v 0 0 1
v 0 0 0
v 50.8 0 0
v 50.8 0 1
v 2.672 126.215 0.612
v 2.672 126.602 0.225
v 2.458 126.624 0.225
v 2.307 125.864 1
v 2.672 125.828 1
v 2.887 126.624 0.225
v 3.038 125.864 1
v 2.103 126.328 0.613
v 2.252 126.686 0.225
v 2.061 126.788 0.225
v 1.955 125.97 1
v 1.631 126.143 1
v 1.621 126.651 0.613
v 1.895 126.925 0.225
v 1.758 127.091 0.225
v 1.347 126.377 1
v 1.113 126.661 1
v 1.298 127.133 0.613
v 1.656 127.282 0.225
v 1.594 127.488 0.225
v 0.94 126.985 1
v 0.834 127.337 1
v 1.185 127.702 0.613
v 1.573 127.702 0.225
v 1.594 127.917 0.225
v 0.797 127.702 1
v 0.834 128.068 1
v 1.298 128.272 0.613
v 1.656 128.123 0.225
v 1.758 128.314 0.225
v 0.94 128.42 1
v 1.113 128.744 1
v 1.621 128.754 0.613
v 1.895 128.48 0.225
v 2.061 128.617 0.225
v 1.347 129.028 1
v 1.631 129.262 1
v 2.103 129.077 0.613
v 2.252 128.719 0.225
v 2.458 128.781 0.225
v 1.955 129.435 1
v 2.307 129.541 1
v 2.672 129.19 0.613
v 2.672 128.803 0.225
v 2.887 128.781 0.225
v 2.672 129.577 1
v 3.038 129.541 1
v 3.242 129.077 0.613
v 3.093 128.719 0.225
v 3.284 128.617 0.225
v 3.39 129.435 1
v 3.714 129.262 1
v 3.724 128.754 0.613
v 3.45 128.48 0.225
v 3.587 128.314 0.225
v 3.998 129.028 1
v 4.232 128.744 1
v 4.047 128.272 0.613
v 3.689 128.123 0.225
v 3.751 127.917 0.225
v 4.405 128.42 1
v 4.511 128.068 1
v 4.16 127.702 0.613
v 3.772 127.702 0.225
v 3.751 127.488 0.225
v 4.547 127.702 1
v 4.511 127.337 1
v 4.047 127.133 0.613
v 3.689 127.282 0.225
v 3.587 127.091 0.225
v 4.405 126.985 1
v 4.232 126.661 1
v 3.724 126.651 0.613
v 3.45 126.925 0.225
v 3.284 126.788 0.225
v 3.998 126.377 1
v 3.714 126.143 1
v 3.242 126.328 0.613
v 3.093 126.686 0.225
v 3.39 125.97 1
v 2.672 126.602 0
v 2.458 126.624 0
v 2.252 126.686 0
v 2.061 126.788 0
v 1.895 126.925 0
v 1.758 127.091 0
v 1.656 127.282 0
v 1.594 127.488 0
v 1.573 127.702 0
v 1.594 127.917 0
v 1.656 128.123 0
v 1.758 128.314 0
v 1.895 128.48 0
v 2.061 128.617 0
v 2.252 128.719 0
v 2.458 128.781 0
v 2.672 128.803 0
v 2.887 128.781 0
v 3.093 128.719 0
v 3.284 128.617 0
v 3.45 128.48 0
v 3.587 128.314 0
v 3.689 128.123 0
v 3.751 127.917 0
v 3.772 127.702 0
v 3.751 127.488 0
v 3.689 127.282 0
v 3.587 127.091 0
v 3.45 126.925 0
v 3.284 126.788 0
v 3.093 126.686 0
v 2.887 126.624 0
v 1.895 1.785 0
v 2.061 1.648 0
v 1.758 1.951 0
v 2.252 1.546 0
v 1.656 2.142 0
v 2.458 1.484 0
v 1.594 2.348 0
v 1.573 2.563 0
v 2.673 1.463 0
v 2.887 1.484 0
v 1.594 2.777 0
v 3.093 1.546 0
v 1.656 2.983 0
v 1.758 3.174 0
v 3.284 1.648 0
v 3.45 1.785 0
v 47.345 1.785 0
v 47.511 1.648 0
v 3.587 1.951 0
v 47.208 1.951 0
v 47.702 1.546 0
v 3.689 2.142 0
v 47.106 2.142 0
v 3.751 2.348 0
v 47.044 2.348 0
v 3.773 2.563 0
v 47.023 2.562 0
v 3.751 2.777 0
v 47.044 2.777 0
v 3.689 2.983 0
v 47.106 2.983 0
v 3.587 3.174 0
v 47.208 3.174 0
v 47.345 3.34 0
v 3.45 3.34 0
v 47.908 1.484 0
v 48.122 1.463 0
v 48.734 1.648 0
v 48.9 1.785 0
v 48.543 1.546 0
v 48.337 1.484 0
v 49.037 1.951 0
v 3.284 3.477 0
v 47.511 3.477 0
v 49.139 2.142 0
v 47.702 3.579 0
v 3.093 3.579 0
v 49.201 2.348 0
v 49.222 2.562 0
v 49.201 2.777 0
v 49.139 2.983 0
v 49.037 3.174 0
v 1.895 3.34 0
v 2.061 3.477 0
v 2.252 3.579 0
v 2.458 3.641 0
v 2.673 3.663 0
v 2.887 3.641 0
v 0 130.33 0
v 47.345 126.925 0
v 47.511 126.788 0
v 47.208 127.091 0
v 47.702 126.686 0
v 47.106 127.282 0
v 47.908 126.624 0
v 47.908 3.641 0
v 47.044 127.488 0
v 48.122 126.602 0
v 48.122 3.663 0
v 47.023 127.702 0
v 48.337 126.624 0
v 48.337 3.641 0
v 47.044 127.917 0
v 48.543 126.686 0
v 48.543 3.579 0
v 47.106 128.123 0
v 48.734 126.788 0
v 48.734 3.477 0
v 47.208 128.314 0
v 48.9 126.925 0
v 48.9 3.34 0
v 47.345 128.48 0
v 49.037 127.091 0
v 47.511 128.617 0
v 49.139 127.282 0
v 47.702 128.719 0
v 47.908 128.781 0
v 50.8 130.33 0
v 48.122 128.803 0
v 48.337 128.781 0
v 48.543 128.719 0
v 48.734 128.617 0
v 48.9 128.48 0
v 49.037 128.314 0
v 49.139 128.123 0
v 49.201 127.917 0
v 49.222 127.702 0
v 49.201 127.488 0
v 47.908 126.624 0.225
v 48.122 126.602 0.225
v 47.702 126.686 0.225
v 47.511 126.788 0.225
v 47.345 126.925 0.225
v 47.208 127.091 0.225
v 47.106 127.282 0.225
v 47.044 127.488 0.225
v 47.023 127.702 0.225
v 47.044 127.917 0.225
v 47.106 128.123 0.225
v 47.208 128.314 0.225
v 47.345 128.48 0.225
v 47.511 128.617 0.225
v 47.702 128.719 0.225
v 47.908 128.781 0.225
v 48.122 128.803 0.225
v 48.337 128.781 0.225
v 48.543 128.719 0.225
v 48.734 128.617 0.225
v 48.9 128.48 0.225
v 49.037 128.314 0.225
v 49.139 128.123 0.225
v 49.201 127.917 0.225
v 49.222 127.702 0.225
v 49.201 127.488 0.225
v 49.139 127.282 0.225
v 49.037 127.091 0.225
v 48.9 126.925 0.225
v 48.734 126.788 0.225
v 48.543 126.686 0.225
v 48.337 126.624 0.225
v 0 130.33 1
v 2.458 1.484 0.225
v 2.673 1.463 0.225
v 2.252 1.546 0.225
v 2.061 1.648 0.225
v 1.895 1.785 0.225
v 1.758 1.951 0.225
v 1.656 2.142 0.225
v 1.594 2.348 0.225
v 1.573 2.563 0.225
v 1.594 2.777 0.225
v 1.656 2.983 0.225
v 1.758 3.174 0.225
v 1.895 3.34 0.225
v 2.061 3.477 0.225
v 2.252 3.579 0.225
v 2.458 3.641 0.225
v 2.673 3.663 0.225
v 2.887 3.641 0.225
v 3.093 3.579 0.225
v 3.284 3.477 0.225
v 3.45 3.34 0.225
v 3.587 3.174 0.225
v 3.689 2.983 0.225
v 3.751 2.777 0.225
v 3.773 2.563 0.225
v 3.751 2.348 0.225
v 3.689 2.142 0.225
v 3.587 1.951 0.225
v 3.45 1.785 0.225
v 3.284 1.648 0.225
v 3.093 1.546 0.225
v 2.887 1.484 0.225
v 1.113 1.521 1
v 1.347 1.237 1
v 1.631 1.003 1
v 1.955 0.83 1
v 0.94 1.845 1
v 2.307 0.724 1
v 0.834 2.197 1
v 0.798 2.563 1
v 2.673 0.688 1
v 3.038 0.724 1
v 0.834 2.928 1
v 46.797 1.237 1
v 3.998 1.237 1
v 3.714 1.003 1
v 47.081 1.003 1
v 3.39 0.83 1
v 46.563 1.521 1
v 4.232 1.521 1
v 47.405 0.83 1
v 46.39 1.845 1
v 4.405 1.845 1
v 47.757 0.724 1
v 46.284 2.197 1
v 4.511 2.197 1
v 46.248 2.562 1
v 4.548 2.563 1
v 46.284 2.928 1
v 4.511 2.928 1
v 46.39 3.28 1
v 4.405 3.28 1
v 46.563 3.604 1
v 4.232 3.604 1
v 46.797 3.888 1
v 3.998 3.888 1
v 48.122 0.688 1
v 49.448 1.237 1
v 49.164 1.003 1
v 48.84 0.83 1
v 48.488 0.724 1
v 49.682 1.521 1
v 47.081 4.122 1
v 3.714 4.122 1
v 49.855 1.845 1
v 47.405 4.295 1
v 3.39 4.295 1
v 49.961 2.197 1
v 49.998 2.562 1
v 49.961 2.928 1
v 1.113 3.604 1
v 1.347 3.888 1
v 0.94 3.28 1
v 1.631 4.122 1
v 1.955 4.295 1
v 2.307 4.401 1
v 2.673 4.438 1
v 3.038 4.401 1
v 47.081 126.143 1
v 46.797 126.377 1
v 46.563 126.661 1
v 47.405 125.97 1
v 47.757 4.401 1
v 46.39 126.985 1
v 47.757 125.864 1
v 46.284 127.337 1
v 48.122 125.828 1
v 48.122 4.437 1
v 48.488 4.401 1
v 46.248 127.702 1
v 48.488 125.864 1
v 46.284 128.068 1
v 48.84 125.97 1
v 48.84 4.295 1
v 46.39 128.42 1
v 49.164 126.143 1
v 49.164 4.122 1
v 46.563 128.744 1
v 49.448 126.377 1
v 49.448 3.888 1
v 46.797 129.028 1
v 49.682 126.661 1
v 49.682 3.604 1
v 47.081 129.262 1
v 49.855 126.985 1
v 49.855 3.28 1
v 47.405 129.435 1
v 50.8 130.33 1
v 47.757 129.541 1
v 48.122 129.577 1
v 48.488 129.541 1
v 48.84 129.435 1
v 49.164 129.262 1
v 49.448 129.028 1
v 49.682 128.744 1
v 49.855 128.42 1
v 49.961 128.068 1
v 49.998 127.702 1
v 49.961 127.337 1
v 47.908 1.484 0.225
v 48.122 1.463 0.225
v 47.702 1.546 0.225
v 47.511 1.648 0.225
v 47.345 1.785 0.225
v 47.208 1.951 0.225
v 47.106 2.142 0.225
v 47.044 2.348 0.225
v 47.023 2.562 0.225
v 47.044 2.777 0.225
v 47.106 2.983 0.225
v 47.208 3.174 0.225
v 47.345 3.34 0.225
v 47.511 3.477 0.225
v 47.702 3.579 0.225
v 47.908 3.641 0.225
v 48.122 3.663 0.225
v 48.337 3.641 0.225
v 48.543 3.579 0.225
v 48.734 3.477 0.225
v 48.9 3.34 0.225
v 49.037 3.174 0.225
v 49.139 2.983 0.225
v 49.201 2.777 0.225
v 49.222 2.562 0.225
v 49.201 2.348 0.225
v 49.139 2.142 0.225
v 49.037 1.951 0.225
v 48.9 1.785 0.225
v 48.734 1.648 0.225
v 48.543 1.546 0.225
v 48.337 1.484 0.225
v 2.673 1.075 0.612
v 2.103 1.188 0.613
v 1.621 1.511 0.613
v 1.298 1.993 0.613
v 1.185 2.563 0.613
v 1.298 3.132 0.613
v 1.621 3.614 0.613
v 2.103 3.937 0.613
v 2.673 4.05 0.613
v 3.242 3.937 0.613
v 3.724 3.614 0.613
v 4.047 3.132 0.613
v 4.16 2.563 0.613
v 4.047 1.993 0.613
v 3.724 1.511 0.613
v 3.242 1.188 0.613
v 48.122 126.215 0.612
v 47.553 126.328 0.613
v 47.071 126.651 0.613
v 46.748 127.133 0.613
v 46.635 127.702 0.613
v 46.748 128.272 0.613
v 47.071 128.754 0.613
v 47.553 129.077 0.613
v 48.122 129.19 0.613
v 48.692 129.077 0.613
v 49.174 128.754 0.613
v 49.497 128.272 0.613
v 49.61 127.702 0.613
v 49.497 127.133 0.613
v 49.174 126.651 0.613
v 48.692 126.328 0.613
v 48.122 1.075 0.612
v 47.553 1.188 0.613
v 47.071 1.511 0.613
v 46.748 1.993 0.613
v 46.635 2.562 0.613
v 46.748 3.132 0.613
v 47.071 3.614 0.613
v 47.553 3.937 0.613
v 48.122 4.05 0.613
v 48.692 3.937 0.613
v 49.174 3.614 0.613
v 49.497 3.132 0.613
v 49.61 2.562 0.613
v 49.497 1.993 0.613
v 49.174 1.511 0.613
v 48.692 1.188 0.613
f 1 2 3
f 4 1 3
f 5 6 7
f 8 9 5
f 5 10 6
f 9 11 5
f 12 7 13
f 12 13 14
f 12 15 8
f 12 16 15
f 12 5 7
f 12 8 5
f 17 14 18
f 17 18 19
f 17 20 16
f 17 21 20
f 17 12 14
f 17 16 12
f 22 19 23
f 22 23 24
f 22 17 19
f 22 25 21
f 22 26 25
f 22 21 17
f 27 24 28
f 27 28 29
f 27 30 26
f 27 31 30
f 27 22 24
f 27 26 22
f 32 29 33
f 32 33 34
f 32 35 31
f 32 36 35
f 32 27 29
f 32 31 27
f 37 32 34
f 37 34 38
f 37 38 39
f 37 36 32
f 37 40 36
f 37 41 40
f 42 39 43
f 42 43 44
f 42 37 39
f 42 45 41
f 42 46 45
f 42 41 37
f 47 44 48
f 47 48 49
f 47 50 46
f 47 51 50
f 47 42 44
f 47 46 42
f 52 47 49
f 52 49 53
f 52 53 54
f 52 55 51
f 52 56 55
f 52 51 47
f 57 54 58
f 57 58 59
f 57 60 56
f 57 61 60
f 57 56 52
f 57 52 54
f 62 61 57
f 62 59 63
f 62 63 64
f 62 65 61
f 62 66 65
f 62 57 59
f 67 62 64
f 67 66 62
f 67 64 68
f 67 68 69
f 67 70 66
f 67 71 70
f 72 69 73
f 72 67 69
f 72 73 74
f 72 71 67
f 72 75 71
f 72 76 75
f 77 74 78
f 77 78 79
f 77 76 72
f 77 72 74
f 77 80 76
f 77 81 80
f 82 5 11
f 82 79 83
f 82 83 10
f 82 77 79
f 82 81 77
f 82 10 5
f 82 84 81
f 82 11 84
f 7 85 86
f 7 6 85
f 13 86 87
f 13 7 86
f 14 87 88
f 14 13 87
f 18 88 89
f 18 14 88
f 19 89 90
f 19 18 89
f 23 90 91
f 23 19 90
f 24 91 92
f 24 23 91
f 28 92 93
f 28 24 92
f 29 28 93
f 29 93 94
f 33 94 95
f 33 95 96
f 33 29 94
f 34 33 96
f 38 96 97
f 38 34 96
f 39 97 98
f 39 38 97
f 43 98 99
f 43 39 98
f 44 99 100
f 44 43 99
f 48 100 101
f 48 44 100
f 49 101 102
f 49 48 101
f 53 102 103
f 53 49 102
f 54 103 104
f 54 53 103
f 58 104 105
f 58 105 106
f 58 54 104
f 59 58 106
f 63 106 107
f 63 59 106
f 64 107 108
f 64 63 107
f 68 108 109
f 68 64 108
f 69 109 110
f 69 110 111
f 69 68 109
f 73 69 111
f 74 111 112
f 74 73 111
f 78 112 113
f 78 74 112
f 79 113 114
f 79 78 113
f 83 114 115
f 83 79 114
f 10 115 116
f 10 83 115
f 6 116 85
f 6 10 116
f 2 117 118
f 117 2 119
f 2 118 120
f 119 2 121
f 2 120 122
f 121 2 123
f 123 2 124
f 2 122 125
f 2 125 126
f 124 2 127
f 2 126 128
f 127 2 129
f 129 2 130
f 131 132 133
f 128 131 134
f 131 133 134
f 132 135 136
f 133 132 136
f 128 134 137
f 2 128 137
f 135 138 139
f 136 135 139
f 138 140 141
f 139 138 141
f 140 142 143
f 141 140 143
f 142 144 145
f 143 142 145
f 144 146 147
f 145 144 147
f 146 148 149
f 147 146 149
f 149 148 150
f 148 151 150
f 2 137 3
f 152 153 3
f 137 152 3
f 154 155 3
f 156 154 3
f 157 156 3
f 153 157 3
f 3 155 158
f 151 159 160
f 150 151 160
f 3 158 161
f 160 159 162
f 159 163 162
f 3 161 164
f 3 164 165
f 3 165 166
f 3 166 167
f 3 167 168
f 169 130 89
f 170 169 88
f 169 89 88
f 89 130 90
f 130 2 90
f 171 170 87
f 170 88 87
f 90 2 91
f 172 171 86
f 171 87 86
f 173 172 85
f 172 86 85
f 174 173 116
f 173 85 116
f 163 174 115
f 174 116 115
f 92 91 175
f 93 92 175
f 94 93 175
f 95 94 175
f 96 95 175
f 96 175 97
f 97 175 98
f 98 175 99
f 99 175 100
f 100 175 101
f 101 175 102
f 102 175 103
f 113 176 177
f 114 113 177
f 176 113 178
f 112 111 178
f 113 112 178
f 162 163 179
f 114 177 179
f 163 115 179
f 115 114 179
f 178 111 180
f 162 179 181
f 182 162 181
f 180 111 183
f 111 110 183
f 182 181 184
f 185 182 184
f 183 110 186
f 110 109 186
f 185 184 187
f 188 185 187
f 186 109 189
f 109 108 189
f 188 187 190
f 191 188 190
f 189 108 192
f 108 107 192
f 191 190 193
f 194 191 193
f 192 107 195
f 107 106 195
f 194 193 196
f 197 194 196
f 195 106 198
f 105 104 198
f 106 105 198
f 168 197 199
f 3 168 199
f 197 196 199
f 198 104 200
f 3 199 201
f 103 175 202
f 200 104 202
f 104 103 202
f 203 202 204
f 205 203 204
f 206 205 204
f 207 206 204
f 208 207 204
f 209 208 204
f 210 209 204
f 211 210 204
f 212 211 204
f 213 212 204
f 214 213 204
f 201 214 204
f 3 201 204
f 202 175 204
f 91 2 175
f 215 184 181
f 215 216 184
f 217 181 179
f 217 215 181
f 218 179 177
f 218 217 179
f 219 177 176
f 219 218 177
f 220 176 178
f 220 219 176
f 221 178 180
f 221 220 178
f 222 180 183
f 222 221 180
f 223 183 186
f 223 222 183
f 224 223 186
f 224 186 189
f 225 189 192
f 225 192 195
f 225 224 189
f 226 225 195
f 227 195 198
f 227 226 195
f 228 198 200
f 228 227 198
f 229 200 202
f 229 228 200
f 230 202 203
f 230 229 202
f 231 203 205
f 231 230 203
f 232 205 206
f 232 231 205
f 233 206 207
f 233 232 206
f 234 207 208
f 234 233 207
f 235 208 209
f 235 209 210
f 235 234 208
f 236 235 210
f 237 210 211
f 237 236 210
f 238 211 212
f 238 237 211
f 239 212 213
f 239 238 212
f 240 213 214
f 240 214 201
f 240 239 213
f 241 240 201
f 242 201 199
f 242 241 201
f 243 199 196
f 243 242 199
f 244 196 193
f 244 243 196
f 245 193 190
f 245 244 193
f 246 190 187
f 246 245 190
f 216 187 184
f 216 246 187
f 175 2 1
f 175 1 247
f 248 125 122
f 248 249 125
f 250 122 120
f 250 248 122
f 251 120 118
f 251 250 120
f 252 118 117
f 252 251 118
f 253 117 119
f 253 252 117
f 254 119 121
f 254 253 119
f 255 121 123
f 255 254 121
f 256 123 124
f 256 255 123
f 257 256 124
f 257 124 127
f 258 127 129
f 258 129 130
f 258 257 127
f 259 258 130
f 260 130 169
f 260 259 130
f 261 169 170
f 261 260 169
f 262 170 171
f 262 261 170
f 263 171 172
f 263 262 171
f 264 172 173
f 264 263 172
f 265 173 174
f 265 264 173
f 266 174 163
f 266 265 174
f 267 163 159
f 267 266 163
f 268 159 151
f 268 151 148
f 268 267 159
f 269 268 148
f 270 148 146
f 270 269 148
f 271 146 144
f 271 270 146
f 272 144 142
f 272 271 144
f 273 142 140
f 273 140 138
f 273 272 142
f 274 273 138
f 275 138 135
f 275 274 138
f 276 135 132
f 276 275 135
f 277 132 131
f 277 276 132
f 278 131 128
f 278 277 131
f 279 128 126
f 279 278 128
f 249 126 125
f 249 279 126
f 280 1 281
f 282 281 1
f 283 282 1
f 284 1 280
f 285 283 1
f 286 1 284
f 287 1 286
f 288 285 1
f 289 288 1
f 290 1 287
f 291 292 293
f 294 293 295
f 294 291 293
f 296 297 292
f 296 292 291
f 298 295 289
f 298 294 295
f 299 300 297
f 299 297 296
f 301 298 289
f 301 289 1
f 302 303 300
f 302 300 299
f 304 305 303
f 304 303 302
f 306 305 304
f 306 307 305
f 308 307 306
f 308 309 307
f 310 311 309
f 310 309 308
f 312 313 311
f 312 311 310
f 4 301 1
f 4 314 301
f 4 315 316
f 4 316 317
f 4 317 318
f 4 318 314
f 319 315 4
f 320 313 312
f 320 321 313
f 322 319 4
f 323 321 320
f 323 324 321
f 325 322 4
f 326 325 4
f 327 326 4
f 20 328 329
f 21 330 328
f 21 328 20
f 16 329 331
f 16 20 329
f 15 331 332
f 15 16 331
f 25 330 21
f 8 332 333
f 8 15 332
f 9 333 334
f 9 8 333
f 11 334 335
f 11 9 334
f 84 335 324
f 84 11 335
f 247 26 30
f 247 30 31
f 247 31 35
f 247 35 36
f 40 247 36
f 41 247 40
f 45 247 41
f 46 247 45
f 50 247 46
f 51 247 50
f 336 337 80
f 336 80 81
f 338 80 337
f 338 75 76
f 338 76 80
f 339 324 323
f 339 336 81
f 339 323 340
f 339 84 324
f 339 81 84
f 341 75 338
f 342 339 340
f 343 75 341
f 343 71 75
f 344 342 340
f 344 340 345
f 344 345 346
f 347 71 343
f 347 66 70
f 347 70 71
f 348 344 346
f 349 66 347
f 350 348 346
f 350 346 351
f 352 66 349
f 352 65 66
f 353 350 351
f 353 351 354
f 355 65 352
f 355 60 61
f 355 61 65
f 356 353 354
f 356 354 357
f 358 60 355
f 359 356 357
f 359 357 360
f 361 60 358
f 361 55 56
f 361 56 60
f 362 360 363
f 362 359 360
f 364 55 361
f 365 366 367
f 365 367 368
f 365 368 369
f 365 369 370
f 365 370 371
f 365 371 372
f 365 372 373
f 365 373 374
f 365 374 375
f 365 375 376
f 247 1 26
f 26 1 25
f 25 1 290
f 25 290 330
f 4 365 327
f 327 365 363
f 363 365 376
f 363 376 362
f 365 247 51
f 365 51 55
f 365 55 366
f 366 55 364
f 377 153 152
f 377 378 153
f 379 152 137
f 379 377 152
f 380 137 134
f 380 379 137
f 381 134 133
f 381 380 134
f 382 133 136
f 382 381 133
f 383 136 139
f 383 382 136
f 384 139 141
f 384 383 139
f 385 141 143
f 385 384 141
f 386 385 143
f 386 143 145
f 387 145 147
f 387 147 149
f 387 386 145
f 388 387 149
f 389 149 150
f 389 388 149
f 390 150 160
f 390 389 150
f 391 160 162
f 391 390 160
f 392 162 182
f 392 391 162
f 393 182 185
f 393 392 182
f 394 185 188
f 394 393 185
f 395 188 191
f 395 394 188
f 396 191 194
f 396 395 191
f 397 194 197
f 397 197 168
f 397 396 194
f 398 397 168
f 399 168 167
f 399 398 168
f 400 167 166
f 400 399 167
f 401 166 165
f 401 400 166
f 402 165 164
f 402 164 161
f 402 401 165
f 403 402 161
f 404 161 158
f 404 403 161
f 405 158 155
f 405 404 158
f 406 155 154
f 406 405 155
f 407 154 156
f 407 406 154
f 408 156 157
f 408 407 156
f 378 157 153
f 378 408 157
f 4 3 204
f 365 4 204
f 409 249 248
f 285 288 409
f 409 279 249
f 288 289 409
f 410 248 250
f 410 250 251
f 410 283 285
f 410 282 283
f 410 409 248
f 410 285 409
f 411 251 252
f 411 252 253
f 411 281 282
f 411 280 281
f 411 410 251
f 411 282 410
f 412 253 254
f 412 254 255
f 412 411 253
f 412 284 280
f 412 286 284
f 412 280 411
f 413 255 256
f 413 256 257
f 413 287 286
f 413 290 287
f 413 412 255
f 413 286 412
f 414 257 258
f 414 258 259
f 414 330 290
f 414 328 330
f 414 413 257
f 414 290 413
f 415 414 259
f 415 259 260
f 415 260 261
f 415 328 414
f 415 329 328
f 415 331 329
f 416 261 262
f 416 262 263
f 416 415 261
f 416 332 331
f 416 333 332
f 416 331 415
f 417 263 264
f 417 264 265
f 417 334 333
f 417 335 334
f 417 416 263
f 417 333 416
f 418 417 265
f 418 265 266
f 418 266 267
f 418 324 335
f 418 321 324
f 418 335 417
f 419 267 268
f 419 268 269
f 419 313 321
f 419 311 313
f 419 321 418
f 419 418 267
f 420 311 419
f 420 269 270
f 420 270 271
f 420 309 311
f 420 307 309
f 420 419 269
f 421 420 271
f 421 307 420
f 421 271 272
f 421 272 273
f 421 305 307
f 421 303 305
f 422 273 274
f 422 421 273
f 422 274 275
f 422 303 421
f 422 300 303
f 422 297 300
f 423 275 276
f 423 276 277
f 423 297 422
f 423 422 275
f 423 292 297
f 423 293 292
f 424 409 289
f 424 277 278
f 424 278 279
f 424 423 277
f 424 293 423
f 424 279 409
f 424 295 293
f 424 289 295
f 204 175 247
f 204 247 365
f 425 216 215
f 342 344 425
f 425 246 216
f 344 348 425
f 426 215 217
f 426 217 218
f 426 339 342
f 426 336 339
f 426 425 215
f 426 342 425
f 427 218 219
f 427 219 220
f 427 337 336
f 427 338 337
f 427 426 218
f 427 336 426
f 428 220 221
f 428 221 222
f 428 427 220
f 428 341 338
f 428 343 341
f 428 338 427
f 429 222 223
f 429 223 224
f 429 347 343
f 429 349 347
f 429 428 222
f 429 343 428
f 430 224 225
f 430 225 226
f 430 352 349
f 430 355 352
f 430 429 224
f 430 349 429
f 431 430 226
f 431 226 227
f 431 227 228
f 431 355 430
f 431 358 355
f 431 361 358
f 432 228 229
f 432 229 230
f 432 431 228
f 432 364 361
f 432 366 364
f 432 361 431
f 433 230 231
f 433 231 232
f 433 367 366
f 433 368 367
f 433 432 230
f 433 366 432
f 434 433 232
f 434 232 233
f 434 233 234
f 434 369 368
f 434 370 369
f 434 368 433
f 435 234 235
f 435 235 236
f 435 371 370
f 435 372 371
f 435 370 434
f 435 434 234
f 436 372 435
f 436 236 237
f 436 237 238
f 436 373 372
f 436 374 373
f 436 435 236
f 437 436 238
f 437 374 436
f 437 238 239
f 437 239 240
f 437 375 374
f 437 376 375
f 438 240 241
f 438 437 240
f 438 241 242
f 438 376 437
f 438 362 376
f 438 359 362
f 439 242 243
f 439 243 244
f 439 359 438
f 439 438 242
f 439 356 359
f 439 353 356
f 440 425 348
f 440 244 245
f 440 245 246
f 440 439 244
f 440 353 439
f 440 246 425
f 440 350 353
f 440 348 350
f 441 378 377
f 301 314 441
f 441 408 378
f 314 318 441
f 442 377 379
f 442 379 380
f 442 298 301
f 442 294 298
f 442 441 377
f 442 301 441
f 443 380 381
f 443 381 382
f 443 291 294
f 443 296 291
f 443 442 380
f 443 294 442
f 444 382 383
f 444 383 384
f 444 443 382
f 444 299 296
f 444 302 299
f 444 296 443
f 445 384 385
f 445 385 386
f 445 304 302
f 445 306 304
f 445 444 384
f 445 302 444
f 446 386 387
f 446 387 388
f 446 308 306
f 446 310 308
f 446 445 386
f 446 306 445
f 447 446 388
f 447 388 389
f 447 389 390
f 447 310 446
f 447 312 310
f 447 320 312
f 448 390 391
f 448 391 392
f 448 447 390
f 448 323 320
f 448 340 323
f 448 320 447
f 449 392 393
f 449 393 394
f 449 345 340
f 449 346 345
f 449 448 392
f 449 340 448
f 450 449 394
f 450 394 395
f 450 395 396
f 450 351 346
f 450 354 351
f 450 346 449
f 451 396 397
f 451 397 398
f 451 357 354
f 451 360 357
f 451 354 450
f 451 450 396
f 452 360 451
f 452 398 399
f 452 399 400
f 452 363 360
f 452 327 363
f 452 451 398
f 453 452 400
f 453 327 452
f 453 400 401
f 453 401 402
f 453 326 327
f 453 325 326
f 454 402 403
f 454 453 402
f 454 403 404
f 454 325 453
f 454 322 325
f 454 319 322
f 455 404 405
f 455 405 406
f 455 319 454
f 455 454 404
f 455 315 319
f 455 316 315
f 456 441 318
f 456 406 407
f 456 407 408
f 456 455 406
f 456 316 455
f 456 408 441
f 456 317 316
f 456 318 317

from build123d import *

# Parameters (mm, degrees)
SKETCH1_W                                      = 50.8
SKETCH1_H                                      = 130.33
BOSS_EXTRUDE1_DEPTH                            = 1
CSK_FOR_M2_FLAT_HEAD_MACHINE_SCREW1_AT_2_COUNT = 2
CSK_FOR_M2_FLAT_HEAD_MACHINE_SCREW1_AT_2_PITCH = 133.137981433
CSK_FOR_M2_FLAT_HEAD_MACHINE_SCREW1_AT_3_COUNT = 2
CSK_FOR_M2_FLAT_HEAD_MACHINE_SCREW1_AT_3_PITCH = 125.14
CSK_FOR_M2_FLAT_HEAD_MACHINE_SCREW1_AT_4_COUNT = 2
CSK_FOR_M2_FLAT_HEAD_MACHINE_SCREW1_AT_4_PITCH = 45.45


with BuildPart() as part:
    # Sketch1 → Boss-Extrude1 (new body)
    with BuildSketch(Plane.XY):
        with Locations((25.4, 65.165)):
            Rectangle(SKETCH1_W, SKETCH1_H)
    extrude(amount=BOSS_EXTRUDE1_DEPTH)

    # Sketch4 → CSK for M2 Flat Head Machine Screw1 (revolve, cut)
    with BuildSketch(Plane(origin=(48.1225, 127.7025, 1), x_dir=(0, -1, 0), z_dir=(1, 0, 0))):
        Polygon((0, 0), (0, 1), (1.1, 1), (1.1, 0.775), (1.875, 0), align=None)
    csk_for_m2_flat_head_machine_screw1 = revolve(axis=Axis((48.1225, 127.7025, 7.35), (0, 0, -1)), mode=Mode.SUBTRACT)

    # CSK for M2 Flat Head Machine Screw1 at 2: CSK for M2 Flat Head Machine Screw1 ×2
    with Locations(*[Vector(-0.341375162, -0.939927124, 0) * (i * CSK_FOR_M2_FLAT_HEAD_MACHINE_SCREW1_AT_2_PITCH) for i in range(1, CSK_FOR_M2_FLAT_HEAD_MACHINE_SCREW1_AT_2_COUNT)]):
        add(csk_for_m2_flat_head_machine_screw1, mode=Mode.SUBTRACT)

    # CSK for M2 Flat Head Machine Screw1 at 3: CSK for M2 Flat Head Machine Screw1 ×2
    with Locations(*[(0, -i * CSK_FOR_M2_FLAT_HEAD_MACHINE_SCREW1_AT_3_PITCH, 0) for i in range(1, CSK_FOR_M2_FLAT_HEAD_MACHINE_SCREW1_AT_3_COUNT)]):
        add(csk_for_m2_flat_head_machine_screw1, mode=Mode.SUBTRACT)

    # CSK for M2 Flat Head Machine Screw1 at 4: CSK for M2 Flat Head Machine Screw1 ×2
    with Locations(*[(-i * CSK_FOR_M2_FLAT_HEAD_MACHINE_SCREW1_AT_4_PITCH, 0, 0) for i in range(1, CSK_FOR_M2_FLAT_HEAD_MACHINE_SCREW1_AT_4_COUNT)]):
        add(csk_for_m2_flat_head_machine_screw1, mode=Mode.SUBTRACT)


solid = part.part
